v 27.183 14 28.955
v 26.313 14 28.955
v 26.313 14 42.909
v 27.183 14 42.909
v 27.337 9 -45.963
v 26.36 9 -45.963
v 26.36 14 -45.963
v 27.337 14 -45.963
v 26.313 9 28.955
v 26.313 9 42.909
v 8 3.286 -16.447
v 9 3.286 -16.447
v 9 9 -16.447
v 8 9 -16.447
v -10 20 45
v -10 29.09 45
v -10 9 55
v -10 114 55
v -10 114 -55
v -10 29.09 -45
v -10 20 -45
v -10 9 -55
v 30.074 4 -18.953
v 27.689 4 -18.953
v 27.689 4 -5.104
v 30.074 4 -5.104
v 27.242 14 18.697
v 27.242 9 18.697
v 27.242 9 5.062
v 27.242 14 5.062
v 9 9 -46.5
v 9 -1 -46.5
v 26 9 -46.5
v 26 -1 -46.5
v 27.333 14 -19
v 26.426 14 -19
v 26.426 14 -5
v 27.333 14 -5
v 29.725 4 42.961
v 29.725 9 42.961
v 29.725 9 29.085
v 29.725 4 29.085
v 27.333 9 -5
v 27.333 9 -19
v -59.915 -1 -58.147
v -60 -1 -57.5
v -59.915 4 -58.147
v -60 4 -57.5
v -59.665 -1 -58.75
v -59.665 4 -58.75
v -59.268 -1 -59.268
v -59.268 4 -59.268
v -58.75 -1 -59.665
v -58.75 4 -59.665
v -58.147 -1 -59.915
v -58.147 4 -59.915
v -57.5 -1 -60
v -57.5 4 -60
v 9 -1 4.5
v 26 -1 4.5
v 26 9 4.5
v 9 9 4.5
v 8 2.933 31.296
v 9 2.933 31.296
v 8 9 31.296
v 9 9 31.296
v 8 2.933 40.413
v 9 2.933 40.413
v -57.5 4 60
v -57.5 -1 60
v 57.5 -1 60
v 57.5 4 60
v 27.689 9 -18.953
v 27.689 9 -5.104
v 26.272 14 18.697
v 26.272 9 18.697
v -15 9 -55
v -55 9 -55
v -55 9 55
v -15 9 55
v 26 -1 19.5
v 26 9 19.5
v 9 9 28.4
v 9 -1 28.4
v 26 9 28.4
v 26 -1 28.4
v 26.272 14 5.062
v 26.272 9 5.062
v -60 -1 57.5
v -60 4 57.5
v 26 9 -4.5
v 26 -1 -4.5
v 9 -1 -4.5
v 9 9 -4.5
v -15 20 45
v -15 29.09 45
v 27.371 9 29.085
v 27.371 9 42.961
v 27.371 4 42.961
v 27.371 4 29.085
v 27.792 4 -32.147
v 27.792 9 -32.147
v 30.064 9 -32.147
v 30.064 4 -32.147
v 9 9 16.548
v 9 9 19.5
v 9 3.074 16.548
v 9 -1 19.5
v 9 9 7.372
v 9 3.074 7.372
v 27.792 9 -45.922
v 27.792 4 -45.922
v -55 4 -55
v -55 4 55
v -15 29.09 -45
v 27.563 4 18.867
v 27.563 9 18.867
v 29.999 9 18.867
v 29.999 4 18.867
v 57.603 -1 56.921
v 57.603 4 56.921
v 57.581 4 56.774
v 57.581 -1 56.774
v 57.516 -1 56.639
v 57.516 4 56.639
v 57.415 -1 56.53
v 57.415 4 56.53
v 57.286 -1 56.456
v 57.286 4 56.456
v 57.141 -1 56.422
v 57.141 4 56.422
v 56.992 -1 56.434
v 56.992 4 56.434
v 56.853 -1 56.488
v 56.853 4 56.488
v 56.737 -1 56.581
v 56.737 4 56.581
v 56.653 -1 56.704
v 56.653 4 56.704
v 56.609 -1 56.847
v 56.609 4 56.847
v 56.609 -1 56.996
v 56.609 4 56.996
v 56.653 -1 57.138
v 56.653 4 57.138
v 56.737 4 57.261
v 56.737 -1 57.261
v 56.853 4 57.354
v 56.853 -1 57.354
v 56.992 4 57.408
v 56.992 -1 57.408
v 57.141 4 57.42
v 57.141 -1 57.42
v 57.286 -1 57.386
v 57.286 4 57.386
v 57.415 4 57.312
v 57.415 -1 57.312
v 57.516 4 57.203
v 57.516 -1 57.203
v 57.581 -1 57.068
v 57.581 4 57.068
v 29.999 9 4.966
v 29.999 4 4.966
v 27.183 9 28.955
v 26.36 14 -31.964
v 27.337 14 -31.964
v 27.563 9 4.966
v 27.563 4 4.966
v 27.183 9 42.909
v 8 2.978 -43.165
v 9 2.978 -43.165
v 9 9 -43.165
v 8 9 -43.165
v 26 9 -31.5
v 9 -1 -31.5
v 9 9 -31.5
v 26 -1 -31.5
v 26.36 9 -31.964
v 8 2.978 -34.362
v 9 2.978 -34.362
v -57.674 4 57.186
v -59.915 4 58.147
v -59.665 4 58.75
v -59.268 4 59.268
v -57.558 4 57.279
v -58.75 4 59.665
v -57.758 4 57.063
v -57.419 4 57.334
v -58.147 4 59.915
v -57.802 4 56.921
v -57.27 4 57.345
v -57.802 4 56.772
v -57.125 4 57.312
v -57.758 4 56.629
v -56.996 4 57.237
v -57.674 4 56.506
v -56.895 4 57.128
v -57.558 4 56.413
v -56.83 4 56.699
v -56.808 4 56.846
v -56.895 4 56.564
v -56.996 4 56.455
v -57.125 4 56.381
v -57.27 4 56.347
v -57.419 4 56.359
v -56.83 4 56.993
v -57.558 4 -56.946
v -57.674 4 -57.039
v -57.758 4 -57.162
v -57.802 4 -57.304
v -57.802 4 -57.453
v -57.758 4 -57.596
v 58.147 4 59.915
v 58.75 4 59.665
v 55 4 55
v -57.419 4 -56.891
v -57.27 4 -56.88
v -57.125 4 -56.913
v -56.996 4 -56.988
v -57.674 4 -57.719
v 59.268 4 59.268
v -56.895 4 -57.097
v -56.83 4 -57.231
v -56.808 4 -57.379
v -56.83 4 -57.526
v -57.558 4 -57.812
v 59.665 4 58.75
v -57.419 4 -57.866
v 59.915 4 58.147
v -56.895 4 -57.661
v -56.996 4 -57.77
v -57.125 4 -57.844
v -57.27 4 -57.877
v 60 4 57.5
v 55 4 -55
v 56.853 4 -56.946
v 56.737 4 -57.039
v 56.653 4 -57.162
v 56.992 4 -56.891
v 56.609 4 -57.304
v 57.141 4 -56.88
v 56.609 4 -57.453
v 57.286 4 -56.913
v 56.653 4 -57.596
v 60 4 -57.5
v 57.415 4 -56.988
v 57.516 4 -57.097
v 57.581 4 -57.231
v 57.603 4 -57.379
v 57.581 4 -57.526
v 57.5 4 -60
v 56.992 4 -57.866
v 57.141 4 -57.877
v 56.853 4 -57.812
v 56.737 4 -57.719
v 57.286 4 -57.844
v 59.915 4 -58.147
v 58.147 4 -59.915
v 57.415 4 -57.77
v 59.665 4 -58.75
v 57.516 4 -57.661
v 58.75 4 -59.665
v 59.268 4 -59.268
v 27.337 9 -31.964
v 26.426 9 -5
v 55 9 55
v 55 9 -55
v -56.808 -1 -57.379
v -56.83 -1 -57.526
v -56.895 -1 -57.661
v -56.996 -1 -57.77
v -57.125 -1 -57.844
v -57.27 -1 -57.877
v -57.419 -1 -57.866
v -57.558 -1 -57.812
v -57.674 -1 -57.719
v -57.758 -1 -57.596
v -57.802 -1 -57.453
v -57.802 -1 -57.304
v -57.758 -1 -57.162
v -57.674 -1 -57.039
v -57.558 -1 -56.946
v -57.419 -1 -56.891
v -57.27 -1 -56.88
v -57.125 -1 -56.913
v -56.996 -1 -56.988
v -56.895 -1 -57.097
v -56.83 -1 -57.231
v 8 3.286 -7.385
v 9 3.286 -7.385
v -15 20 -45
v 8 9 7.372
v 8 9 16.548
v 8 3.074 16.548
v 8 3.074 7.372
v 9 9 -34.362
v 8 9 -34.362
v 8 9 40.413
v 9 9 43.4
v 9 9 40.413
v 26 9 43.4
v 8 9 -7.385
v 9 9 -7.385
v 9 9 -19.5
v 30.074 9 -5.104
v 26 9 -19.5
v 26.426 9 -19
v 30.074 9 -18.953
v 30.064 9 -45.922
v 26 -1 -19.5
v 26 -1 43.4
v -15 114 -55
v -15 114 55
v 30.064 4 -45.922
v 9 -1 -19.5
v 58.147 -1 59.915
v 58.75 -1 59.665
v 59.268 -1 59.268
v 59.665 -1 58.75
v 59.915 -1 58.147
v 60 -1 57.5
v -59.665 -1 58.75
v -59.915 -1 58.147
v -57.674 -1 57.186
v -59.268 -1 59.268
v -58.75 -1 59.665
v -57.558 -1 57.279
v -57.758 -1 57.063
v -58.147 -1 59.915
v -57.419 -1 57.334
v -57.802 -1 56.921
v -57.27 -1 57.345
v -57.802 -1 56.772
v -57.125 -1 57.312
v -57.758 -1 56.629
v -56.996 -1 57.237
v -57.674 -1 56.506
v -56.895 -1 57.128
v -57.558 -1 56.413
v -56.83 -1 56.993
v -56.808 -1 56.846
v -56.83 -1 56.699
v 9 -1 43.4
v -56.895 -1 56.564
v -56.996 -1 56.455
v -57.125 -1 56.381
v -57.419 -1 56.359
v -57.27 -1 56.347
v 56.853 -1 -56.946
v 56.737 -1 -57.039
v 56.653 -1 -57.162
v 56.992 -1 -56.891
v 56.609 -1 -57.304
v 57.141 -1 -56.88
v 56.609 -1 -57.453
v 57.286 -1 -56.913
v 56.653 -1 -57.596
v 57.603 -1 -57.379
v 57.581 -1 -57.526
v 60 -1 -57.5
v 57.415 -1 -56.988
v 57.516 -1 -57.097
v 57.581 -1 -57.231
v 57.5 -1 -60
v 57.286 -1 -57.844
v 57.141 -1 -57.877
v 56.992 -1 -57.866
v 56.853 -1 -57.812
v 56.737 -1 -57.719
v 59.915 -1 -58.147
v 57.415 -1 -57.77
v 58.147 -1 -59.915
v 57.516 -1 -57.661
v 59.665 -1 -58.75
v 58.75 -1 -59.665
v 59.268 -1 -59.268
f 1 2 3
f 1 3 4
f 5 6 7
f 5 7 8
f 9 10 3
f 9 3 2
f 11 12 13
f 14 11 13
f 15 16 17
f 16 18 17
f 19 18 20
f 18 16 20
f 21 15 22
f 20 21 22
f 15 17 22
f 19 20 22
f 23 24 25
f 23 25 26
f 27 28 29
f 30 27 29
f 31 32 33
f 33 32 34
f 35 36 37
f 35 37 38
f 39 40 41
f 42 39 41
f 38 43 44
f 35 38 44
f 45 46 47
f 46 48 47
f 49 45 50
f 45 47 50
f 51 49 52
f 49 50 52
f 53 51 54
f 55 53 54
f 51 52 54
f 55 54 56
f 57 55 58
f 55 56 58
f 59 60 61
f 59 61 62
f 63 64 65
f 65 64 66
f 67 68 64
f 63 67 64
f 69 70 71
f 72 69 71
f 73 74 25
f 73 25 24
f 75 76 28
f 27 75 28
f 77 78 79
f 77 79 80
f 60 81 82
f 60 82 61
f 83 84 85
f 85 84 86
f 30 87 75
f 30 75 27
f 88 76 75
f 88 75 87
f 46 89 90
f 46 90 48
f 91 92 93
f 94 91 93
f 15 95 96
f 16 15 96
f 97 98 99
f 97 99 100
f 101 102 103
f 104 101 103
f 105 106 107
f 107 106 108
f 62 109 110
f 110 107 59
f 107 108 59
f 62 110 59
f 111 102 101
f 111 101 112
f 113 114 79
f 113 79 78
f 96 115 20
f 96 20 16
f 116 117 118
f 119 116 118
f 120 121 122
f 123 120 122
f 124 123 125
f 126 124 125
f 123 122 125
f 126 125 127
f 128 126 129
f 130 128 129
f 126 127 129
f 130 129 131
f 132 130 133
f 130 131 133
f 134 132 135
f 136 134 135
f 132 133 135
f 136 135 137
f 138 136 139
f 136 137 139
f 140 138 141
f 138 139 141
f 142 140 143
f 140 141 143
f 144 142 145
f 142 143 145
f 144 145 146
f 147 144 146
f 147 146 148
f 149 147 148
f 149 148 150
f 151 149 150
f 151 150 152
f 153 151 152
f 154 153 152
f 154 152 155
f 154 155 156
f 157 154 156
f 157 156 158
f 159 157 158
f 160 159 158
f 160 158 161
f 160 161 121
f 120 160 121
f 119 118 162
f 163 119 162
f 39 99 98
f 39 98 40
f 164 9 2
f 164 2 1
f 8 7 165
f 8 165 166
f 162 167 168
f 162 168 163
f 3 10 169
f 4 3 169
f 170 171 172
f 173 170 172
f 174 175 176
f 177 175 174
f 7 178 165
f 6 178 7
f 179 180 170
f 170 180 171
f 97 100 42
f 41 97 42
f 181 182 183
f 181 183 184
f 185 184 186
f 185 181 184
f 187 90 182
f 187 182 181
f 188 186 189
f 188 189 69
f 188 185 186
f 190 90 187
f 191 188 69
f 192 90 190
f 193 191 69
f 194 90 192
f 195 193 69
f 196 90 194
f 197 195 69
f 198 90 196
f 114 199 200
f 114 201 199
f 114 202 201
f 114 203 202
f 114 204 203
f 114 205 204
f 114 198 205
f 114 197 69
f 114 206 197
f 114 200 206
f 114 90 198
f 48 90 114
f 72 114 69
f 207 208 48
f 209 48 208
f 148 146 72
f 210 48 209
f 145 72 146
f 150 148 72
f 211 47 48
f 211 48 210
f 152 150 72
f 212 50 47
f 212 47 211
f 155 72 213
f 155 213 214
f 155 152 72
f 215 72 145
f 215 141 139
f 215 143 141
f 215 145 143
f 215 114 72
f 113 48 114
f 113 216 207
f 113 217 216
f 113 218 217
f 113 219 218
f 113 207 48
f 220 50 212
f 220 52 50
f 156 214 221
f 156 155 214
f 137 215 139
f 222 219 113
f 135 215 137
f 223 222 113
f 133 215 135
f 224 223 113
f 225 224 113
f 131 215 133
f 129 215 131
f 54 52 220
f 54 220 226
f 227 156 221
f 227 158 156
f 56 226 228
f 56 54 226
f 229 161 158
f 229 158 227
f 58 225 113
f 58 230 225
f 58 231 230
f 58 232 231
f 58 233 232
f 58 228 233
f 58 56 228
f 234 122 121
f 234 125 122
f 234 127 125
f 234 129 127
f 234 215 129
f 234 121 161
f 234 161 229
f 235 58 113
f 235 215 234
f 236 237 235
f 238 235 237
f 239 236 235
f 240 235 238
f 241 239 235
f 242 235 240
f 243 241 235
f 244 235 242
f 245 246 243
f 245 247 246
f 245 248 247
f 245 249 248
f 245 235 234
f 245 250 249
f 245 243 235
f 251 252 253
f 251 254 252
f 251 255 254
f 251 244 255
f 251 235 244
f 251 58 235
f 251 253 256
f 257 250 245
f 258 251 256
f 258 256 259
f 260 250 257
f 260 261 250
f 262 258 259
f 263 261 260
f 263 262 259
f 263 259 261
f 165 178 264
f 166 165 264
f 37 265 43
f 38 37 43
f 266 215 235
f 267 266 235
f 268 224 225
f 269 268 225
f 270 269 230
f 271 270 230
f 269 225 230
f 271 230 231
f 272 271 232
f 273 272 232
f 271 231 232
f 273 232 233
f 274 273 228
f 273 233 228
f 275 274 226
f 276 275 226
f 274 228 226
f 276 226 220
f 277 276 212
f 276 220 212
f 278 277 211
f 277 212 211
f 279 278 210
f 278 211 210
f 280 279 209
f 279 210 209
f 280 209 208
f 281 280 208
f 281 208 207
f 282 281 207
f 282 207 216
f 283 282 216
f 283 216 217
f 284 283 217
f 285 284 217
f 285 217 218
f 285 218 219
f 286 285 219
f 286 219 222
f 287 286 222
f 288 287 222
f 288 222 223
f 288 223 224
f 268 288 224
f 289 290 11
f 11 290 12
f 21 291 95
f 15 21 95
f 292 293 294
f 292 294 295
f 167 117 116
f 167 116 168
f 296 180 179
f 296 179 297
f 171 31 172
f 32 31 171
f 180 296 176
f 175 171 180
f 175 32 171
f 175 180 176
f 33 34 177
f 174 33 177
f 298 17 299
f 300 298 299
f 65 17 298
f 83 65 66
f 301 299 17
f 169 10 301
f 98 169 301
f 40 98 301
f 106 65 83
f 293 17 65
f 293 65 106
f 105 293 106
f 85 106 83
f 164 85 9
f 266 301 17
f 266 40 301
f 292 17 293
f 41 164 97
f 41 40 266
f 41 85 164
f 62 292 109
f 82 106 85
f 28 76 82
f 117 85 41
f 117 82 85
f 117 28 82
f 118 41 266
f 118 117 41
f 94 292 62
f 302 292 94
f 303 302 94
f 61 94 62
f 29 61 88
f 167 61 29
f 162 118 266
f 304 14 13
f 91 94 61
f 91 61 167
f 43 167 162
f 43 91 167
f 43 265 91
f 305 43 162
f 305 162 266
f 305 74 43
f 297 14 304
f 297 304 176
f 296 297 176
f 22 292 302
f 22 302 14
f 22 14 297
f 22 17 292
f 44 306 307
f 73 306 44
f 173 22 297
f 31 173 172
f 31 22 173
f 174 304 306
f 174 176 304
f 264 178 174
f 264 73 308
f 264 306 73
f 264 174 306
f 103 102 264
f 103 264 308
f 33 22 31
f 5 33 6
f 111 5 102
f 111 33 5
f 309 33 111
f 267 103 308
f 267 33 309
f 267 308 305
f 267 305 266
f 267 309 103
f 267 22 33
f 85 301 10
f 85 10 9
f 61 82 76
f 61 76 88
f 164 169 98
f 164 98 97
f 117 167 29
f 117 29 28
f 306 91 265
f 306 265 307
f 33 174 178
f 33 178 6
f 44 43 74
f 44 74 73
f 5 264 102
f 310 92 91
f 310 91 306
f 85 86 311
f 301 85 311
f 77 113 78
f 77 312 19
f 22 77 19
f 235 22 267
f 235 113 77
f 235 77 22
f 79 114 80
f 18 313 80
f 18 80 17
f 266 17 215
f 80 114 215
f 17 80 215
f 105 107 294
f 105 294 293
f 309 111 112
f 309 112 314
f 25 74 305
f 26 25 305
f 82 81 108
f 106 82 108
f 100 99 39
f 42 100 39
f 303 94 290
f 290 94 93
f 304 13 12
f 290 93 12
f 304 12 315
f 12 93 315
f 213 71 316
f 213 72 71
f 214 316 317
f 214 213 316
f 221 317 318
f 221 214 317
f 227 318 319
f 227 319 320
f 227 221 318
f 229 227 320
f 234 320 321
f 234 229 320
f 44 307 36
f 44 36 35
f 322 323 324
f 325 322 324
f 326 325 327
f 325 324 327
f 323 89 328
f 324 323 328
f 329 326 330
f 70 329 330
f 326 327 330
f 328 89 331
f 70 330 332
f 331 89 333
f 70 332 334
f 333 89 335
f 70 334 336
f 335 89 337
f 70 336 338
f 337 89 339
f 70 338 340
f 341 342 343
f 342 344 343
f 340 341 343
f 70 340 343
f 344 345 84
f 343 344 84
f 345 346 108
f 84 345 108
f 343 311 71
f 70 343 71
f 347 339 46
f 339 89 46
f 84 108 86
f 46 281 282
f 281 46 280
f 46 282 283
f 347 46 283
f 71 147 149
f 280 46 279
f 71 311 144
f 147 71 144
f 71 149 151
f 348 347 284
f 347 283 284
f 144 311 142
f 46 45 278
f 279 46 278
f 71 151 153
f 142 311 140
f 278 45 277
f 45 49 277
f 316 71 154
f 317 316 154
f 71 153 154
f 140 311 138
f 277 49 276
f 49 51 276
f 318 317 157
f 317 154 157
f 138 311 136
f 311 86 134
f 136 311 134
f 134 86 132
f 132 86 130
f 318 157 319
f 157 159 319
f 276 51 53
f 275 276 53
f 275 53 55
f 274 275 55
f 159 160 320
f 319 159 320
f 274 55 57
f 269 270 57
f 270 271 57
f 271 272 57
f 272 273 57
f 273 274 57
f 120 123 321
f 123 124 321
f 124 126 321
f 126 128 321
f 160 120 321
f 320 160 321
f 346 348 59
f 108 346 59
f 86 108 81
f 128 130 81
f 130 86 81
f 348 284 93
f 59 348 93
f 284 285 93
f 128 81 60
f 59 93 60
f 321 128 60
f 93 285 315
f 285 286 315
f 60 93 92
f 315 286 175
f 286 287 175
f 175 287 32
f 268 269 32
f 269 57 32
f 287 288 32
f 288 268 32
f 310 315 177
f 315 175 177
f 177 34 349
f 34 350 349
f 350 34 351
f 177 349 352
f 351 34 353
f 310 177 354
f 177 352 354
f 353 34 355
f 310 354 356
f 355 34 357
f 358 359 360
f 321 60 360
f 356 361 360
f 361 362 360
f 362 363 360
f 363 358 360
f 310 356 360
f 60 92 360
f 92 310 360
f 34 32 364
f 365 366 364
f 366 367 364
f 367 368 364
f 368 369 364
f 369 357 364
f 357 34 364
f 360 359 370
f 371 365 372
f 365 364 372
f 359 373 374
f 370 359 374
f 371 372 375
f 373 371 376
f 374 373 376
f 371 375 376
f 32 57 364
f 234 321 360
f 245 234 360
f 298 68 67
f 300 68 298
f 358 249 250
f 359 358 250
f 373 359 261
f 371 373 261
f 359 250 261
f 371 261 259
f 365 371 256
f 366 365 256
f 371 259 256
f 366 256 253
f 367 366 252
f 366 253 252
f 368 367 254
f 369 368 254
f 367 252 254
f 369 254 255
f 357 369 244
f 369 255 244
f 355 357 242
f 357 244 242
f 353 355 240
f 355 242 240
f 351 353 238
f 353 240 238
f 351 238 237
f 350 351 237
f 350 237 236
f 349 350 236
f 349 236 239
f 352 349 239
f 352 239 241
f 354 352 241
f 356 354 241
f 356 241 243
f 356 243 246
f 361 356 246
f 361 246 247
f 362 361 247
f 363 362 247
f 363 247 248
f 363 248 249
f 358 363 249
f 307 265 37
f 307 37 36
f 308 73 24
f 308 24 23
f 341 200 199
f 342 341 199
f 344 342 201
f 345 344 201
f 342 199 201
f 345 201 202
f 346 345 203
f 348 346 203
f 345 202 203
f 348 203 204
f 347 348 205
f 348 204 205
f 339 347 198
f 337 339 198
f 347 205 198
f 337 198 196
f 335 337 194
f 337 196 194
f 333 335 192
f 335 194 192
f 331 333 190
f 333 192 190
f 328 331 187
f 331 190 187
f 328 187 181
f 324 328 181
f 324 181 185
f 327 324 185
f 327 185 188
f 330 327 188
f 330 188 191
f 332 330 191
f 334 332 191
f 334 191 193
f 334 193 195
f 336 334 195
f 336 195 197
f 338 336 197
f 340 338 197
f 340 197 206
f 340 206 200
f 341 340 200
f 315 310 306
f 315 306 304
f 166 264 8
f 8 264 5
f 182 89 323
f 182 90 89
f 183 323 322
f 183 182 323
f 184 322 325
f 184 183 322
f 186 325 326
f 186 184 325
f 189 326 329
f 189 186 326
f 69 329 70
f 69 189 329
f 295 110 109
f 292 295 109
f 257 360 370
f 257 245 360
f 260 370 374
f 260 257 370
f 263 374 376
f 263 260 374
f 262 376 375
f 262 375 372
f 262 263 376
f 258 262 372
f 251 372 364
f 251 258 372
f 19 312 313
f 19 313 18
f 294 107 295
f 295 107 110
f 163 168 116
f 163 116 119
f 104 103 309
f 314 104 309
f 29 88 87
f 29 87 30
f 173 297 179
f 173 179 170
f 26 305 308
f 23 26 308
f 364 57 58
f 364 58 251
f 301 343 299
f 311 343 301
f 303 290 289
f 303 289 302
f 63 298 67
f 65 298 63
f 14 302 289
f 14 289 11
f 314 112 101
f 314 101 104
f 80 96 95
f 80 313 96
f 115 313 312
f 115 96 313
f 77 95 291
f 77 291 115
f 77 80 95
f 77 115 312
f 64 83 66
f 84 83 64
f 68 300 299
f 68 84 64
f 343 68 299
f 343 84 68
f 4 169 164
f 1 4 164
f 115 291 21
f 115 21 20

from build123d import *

# Parameters (mm, degrees)
BOSS_EXTRUDE1_DEPTH          = 4
BOSS_EXTRUDE1_DEPTH_BACK     = 1
SKETCH1_W                    = 120
SKETCH1_H                    = 120
FILLET1_R                    = 2.5
SKETCH34_W                   = 110
SKETCH34_H                   = 110
BOSS_EXTRUDE4_DEPTH          = 5
SKETCH35_W                   = 5
SKETCH35_H                   = 110
BOSS_EXTRUDE5_DEPTH          = 105
SKETCH36_W                   = 90
SKETCH36_H                   = 9.090388829
CUT_EXTRUDE17_DEPTH          = 5
F_97_0_0059_DIAMETER_HOLE2_D = 0.14986
F_1_0MM_DOWEL_HOLE1_D        = 1
SKETCH46_W                   = 17
SKETCH46_H                   = 15
CUT_EXTRUDE23_DEPTH          = 10
SKETCH50_W                   = 17
SKETCH50_H                   = 15
CUT_EXTRUDE24_DEPTH          = 10
SKETCH51_W                   = 17
SKETCH51_H                   = 15
CUT_EXTRUDE25_DEPTH          = 10
SKETCH52_W                   = 17
SKETCH52_H                   = 15
CUT_EXTRUDE26_DEPTH          = 10
SKETCH53_W                   = 0.977162156
SKETCH53_H                   = 13.998719243
BOSS_EXTRUDE6_DEPTH          = 5
SKETCH55_W                   = 2.272024092
SKETCH55_H                   = 13.774773728
CUT_EXTRUDE27_DEPTH          = 5
SKETCH56_W                   = 0.906735868
SKETCH56_H                   = 14
BOSS_EXTRUDE7_DEPTH          = 5
SKETCH57_W                   = 2.385496373
SKETCH57_H                   = 13.848261841
CUT_EXTRUDE28_DEPTH          = 5
SKETCH58_W                   = 0.96928262
SKETCH58_H                   = 13.634621905
BOSS_EXTRUDE8_DEPTH          = 5
SKETCH59_W                   = 2.435671648
SKETCH59_H                   = 13.900580395
CUT_EXTRUDE29_DEPTH          = 5
SKETCH60_W                   = 0.869613575
SKETCH60_H                   = 13.953535455
BOSS_EXTRUDE10_DEPTH         = 5
SKETCH62_W                   = 2.354070132
SKETCH62_H                   = 13.876017007
CUT_EXTRUDE30_DEPTH          = 5
SKETCH63_W                   = 9.117005695
SKETCH63_H                   = 6.066926996
CUT_EXTRUDE33_DEPTH          = 1
SKETCH64_W                   = 9.176846486
SKETCH64_H                   = 5.926214746
CUT_EXTRUDE34_DEPTH          = 1
SKETCH65_W                   = 9.062729826
SKETCH65_H                   = 5.966132982
CUT_EXTRUDE35_DEPTH          = 1
SKETCH67_W                   = 8.803701295
SKETCH67_H                   = 6.022435514
CUT_EXTRUDE36_DEPTH          = 1


with BuildPart() as part:
    # Sketch1 → Boss-Extrude1 (new, two sides: drawn at the far end of the back side and taken through both)
    with BuildSketch(Plane(origin=(0, 0, 0), x_dir=(1, 0, 0), z_dir=(0, 1, 0)).offset(-BOSS_EXTRUDE1_DEPTH_BACK)):
        Rectangle(SKETCH1_W, SKETCH1_H)
    extrude(amount=BOSS_EXTRUDE1_DEPTH + BOSS_EXTRUDE1_DEPTH_BACK)

    # Fillet1
    fillet1_edges = [part.edges().sort_by_distance(p)[0] for p in [
        (-60, 1.5, -60),
        (60, 1.5, -60),
        (60, 1.5, 60),
        (-60, 1.5, 60),
    ]]
    fillet(fillet1_edges, radius=FILLET1_R)

    # Sketch34 → Boss-Extrude4 (add)
    with BuildSketch(Plane(origin=(0, 4, 0), x_dir=(1, 0, 0), z_dir=(0, 1, 0))):
        Rectangle(SKETCH34_W, SKETCH34_H)
    extrude(amount=BOSS_EXTRUDE4_DEPTH)

    # Sketch35 → Boss-Extrude5 (add)
    with BuildSketch(Plane(origin=(0, 9, 0), x_dir=(1, 0, 0), z_dir=(0, 1, 0))):
        with Locations((-12.5, 0)):
            Rectangle(SKETCH35_W, SKETCH35_H)
    extrude(amount=BOSS_EXTRUDE5_DEPTH)

    # Sketch36 → Cut-Extrude17 (cut)
    with BuildSketch(Plane(origin=(-15, 5, 0), x_dir=(0, 0, 1), z_dir=(-1, 0, 0))):
        with Locations((0, 19.545194415)):
            Rectangle(SKETCH36_W, SKETCH36_H)
    extrude(amount=-CUT_EXTRUDE17_DEPTH, mode=Mode.SUBTRACT)

    # 97 _0.0059_ Diameter Hole2 (through all)
    with Locations(Plane(origin=(0, -1, 0), x_dir=(-1, 0, 0), z_dir=(0, -1, 0))):
        with Locations((57.307733748, 57.378842828), (-57.10337646, 57.378842828), (-57.10337646, -56.921022458), (57.307733748, -56.921022458)):
            Hole(F_97_0_0059_DIAMETER_HOLE2_D / 2)

    # 1.0mm Dowel Hole1 (through all)
    with Locations(Plane(origin=(0, -1, 0), x_dir=(-1, 0, 0), z_dir=(0, -1, 0))):
        with Locations((57.307733748, -56.846092458), (-57.10337646, -56.921022458), (-57.10337646, 57.378842828), (57.307733748, 57.378842828)):
            Hole(F_1_0MM_DOWEL_HOLE1_D / 2)

    # Sketch46 → Cut-Extrude23 (cut)
    with BuildSketch(Plane(origin=(0, -1, 4), x_dir=(1, 0, 0), z_dir=(0, -1, 0))):
        with Locations((17.5, 31.9)):
            Rectangle(SKETCH46_W, SKETCH46_H)
    extrude(amount=-CUT_EXTRUDE23_DEPTH, mode=Mode.SUBTRACT)

    # Sketch50 → Cut-Extrude24 (cut)
    with BuildSketch(Plane(origin=(0, -1, 5), x_dir=(-1, 0, 0), z_dir=(0, -1, 0))):
        with Locations((-17.5, -7)):
            Rectangle(SKETCH50_W, SKETCH50_H)
    extrude(amount=-CUT_EXTRUDE24_DEPTH, mode=Mode.SUBTRACT)

    # Sketch51 → Cut-Extrude25 (cut)
    with BuildSketch(Plane(origin=(0, -1, 6), x_dir=(-1, 0, 0), z_dir=(0, -1, 0))):
        with Locations((-17.5, 18)):
            Rectangle(SKETCH51_W, SKETCH51_H)
    extrude(amount=-CUT_EXTRUDE25_DEPTH, mode=Mode.SUBTRACT)

    # Sketch52 → Cut-Extrude26 (cut)
    with BuildSketch(Plane(origin=(0, -1, 4), x_dir=(1, 0, 0), z_dir=(0, -1, 0))):
        with Locations((17.5, -43)):
            Rectangle(SKETCH52_W, SKETCH52_H)
    extrude(amount=-CUT_EXTRUDE26_DEPTH, mode=Mode.SUBTRACT)

    # Sketch53 → Boss-Extrude6 (add)
    with BuildSketch(Plane(origin=(-2.93050065, 9, 0.122093772), x_dir=(1, 0, 0), z_dir=(0, 1, 0))):
        with Locations((29.779301797, 39.085351217)):
            Rectangle(SKETCH53_W, SKETCH53_H)
    extrude(amount=BOSS_EXTRUDE6_DEPTH)

    # Sketch55 → Cut-Extrude27 (cut)
    with BuildSketch(Plane(origin=(-2.539176839, 9, 0.049591215), x_dir=(1, 0, 0), z_dir=(0, 1, 0))):
        with Locations((31.467069737, 39.084159637)):
            Rectangle(SKETCH55_W, SKETCH55_H)
    extrude(amount=-CUT_EXTRUDE27_DEPTH, mode=Mode.SUBTRACT)

    # Sketch56 → Boss-Extrude7 (add)
    with BuildSketch(Plane(origin=(-2.001675953, 9, 0), x_dir=(1, 0, 0), z_dir=(0, 1, 0))):
        with Locations((28.881264054, 12)):
            Rectangle(SKETCH56_W, SKETCH56_H)
    extrude(amount=BOSS_EXTRUDE7_DEPTH)

    # Sketch57 → Cut-Extrude28 (cut)
    with BuildSketch(Plane(origin=(-2.324919513, 9, 0), x_dir=(1, 0, 0), z_dir=(0, 1, 0))):
        with Locations((31.20631194, 12.028513798)):
            Rectangle(SKETCH57_W, SKETCH57_H)
    extrude(amount=-CUT_EXTRUDE28_DEPTH, mode=Mode.SUBTRACT)

    # Sketch58 → Boss-Extrude8 (add)
    with BuildSketch(Plane(origin=(-1.839703038, 9, 0), x_dir=(1, 0, 0), z_dir=(0, 1, 0))):
        with Locations((28.596634058, -11.879280286)):
            Rectangle(SKETCH58_W, SKETCH58_H)
    extrude(amount=BOSS_EXTRUDE8_DEPTH)

    # Sketch59 → Cut-Extrude29 (cut)
    with BuildSketch(Plane(origin=(-2.765819175, 9, 0), x_dir=(1, 0, 0), z_dir=(0, 1, 0))):
        with Locations((31.546866825, -11.916750925)):
            Rectangle(SKETCH59_W, SKETCH59_H)
    extrude(amount=-CUT_EXTRUDE29_DEPTH, mode=Mode.SUBTRACT)

    # Sketch60 → Boss-Extrude10 (add)
    with BuildSketch(Plane(origin=(-1.803689022, 9, -0.186210488), x_dir=(1, 0, 0), z_dir=(0, 1, 0))):
        with Locations((28.551773242, -36.1181464)):
            Rectangle(SKETCH60_W, SKETCH60_H)
    extrude(amount=BOSS_EXTRUDE10_DEPTH)

    # Sketch62 → Cut-Extrude30 (cut)
    with BuildSketch(Plane(origin=(-2.856074078, 9, -0.042608941), x_dir=(1, 0, 0), z_dir=(0, 1, 0))):
        with Locations((31.403731497, -36.065246957)):
            Rectangle(SKETCH62_W, SKETCH62_H)
    extrude(amount=-CUT_EXTRUDE30_DEPTH, mode=Mode.SUBTRACT)

    # Sketch63 → Cut-Extrude33 (cut)
    with BuildSketch(Plane(origin=(9, 0, 0), x_dir=(0, 0, -1), z_dir=(1, 0, 0))):
        with Locations((-35.854544031, 5.966536502)):
            Rectangle(SKETCH63_W, SKETCH63_H)
    extrude(amount=-CUT_EXTRUDE33_DEPTH, mode=Mode.SUBTRACT)

    # Sketch64 → Cut-Extrude34 (cut)
    with BuildSketch(Plane(origin=(9, 0, 0), x_dir=(0, 0, -1), z_dir=(1, 0, 0))):
        with Locations((-11.959924601, 6.036892627)):
            Rectangle(SKETCH64_W, SKETCH64_H)
    extrude(amount=-CUT_EXTRUDE34_DEPTH, mode=Mode.SUBTRACT)

    # Sketch65 → Cut-Extrude35 (cut)
    with BuildSketch(Plane(origin=(9, 0.251826278, 0.170802287), x_dir=(0, 0, -1), z_dir=(1, 0, 0))):
        with Locations((12.086740933, 6.016933509)):
            Rectangle(SKETCH65_W, SKETCH65_H)
    extrude(amount=-CUT_EXTRUDE35_DEPTH, mode=Mode.SUBTRACT)

    # Sketch67 → Cut-Extrude36 (cut)
    with BuildSketch(Plane(origin=(9, 0, 0), x_dir=(0, 0, -1), z_dir=(1, 0, 0))):
        with Locations((38.763636035, 5.988782243)):
            Rectangle(SKETCH67_W, SKETCH67_H)
    extrude(amount=-CUT_EXTRUDE36_DEPTH, mode=Mode.SUBTRACT)


solid = part.part
